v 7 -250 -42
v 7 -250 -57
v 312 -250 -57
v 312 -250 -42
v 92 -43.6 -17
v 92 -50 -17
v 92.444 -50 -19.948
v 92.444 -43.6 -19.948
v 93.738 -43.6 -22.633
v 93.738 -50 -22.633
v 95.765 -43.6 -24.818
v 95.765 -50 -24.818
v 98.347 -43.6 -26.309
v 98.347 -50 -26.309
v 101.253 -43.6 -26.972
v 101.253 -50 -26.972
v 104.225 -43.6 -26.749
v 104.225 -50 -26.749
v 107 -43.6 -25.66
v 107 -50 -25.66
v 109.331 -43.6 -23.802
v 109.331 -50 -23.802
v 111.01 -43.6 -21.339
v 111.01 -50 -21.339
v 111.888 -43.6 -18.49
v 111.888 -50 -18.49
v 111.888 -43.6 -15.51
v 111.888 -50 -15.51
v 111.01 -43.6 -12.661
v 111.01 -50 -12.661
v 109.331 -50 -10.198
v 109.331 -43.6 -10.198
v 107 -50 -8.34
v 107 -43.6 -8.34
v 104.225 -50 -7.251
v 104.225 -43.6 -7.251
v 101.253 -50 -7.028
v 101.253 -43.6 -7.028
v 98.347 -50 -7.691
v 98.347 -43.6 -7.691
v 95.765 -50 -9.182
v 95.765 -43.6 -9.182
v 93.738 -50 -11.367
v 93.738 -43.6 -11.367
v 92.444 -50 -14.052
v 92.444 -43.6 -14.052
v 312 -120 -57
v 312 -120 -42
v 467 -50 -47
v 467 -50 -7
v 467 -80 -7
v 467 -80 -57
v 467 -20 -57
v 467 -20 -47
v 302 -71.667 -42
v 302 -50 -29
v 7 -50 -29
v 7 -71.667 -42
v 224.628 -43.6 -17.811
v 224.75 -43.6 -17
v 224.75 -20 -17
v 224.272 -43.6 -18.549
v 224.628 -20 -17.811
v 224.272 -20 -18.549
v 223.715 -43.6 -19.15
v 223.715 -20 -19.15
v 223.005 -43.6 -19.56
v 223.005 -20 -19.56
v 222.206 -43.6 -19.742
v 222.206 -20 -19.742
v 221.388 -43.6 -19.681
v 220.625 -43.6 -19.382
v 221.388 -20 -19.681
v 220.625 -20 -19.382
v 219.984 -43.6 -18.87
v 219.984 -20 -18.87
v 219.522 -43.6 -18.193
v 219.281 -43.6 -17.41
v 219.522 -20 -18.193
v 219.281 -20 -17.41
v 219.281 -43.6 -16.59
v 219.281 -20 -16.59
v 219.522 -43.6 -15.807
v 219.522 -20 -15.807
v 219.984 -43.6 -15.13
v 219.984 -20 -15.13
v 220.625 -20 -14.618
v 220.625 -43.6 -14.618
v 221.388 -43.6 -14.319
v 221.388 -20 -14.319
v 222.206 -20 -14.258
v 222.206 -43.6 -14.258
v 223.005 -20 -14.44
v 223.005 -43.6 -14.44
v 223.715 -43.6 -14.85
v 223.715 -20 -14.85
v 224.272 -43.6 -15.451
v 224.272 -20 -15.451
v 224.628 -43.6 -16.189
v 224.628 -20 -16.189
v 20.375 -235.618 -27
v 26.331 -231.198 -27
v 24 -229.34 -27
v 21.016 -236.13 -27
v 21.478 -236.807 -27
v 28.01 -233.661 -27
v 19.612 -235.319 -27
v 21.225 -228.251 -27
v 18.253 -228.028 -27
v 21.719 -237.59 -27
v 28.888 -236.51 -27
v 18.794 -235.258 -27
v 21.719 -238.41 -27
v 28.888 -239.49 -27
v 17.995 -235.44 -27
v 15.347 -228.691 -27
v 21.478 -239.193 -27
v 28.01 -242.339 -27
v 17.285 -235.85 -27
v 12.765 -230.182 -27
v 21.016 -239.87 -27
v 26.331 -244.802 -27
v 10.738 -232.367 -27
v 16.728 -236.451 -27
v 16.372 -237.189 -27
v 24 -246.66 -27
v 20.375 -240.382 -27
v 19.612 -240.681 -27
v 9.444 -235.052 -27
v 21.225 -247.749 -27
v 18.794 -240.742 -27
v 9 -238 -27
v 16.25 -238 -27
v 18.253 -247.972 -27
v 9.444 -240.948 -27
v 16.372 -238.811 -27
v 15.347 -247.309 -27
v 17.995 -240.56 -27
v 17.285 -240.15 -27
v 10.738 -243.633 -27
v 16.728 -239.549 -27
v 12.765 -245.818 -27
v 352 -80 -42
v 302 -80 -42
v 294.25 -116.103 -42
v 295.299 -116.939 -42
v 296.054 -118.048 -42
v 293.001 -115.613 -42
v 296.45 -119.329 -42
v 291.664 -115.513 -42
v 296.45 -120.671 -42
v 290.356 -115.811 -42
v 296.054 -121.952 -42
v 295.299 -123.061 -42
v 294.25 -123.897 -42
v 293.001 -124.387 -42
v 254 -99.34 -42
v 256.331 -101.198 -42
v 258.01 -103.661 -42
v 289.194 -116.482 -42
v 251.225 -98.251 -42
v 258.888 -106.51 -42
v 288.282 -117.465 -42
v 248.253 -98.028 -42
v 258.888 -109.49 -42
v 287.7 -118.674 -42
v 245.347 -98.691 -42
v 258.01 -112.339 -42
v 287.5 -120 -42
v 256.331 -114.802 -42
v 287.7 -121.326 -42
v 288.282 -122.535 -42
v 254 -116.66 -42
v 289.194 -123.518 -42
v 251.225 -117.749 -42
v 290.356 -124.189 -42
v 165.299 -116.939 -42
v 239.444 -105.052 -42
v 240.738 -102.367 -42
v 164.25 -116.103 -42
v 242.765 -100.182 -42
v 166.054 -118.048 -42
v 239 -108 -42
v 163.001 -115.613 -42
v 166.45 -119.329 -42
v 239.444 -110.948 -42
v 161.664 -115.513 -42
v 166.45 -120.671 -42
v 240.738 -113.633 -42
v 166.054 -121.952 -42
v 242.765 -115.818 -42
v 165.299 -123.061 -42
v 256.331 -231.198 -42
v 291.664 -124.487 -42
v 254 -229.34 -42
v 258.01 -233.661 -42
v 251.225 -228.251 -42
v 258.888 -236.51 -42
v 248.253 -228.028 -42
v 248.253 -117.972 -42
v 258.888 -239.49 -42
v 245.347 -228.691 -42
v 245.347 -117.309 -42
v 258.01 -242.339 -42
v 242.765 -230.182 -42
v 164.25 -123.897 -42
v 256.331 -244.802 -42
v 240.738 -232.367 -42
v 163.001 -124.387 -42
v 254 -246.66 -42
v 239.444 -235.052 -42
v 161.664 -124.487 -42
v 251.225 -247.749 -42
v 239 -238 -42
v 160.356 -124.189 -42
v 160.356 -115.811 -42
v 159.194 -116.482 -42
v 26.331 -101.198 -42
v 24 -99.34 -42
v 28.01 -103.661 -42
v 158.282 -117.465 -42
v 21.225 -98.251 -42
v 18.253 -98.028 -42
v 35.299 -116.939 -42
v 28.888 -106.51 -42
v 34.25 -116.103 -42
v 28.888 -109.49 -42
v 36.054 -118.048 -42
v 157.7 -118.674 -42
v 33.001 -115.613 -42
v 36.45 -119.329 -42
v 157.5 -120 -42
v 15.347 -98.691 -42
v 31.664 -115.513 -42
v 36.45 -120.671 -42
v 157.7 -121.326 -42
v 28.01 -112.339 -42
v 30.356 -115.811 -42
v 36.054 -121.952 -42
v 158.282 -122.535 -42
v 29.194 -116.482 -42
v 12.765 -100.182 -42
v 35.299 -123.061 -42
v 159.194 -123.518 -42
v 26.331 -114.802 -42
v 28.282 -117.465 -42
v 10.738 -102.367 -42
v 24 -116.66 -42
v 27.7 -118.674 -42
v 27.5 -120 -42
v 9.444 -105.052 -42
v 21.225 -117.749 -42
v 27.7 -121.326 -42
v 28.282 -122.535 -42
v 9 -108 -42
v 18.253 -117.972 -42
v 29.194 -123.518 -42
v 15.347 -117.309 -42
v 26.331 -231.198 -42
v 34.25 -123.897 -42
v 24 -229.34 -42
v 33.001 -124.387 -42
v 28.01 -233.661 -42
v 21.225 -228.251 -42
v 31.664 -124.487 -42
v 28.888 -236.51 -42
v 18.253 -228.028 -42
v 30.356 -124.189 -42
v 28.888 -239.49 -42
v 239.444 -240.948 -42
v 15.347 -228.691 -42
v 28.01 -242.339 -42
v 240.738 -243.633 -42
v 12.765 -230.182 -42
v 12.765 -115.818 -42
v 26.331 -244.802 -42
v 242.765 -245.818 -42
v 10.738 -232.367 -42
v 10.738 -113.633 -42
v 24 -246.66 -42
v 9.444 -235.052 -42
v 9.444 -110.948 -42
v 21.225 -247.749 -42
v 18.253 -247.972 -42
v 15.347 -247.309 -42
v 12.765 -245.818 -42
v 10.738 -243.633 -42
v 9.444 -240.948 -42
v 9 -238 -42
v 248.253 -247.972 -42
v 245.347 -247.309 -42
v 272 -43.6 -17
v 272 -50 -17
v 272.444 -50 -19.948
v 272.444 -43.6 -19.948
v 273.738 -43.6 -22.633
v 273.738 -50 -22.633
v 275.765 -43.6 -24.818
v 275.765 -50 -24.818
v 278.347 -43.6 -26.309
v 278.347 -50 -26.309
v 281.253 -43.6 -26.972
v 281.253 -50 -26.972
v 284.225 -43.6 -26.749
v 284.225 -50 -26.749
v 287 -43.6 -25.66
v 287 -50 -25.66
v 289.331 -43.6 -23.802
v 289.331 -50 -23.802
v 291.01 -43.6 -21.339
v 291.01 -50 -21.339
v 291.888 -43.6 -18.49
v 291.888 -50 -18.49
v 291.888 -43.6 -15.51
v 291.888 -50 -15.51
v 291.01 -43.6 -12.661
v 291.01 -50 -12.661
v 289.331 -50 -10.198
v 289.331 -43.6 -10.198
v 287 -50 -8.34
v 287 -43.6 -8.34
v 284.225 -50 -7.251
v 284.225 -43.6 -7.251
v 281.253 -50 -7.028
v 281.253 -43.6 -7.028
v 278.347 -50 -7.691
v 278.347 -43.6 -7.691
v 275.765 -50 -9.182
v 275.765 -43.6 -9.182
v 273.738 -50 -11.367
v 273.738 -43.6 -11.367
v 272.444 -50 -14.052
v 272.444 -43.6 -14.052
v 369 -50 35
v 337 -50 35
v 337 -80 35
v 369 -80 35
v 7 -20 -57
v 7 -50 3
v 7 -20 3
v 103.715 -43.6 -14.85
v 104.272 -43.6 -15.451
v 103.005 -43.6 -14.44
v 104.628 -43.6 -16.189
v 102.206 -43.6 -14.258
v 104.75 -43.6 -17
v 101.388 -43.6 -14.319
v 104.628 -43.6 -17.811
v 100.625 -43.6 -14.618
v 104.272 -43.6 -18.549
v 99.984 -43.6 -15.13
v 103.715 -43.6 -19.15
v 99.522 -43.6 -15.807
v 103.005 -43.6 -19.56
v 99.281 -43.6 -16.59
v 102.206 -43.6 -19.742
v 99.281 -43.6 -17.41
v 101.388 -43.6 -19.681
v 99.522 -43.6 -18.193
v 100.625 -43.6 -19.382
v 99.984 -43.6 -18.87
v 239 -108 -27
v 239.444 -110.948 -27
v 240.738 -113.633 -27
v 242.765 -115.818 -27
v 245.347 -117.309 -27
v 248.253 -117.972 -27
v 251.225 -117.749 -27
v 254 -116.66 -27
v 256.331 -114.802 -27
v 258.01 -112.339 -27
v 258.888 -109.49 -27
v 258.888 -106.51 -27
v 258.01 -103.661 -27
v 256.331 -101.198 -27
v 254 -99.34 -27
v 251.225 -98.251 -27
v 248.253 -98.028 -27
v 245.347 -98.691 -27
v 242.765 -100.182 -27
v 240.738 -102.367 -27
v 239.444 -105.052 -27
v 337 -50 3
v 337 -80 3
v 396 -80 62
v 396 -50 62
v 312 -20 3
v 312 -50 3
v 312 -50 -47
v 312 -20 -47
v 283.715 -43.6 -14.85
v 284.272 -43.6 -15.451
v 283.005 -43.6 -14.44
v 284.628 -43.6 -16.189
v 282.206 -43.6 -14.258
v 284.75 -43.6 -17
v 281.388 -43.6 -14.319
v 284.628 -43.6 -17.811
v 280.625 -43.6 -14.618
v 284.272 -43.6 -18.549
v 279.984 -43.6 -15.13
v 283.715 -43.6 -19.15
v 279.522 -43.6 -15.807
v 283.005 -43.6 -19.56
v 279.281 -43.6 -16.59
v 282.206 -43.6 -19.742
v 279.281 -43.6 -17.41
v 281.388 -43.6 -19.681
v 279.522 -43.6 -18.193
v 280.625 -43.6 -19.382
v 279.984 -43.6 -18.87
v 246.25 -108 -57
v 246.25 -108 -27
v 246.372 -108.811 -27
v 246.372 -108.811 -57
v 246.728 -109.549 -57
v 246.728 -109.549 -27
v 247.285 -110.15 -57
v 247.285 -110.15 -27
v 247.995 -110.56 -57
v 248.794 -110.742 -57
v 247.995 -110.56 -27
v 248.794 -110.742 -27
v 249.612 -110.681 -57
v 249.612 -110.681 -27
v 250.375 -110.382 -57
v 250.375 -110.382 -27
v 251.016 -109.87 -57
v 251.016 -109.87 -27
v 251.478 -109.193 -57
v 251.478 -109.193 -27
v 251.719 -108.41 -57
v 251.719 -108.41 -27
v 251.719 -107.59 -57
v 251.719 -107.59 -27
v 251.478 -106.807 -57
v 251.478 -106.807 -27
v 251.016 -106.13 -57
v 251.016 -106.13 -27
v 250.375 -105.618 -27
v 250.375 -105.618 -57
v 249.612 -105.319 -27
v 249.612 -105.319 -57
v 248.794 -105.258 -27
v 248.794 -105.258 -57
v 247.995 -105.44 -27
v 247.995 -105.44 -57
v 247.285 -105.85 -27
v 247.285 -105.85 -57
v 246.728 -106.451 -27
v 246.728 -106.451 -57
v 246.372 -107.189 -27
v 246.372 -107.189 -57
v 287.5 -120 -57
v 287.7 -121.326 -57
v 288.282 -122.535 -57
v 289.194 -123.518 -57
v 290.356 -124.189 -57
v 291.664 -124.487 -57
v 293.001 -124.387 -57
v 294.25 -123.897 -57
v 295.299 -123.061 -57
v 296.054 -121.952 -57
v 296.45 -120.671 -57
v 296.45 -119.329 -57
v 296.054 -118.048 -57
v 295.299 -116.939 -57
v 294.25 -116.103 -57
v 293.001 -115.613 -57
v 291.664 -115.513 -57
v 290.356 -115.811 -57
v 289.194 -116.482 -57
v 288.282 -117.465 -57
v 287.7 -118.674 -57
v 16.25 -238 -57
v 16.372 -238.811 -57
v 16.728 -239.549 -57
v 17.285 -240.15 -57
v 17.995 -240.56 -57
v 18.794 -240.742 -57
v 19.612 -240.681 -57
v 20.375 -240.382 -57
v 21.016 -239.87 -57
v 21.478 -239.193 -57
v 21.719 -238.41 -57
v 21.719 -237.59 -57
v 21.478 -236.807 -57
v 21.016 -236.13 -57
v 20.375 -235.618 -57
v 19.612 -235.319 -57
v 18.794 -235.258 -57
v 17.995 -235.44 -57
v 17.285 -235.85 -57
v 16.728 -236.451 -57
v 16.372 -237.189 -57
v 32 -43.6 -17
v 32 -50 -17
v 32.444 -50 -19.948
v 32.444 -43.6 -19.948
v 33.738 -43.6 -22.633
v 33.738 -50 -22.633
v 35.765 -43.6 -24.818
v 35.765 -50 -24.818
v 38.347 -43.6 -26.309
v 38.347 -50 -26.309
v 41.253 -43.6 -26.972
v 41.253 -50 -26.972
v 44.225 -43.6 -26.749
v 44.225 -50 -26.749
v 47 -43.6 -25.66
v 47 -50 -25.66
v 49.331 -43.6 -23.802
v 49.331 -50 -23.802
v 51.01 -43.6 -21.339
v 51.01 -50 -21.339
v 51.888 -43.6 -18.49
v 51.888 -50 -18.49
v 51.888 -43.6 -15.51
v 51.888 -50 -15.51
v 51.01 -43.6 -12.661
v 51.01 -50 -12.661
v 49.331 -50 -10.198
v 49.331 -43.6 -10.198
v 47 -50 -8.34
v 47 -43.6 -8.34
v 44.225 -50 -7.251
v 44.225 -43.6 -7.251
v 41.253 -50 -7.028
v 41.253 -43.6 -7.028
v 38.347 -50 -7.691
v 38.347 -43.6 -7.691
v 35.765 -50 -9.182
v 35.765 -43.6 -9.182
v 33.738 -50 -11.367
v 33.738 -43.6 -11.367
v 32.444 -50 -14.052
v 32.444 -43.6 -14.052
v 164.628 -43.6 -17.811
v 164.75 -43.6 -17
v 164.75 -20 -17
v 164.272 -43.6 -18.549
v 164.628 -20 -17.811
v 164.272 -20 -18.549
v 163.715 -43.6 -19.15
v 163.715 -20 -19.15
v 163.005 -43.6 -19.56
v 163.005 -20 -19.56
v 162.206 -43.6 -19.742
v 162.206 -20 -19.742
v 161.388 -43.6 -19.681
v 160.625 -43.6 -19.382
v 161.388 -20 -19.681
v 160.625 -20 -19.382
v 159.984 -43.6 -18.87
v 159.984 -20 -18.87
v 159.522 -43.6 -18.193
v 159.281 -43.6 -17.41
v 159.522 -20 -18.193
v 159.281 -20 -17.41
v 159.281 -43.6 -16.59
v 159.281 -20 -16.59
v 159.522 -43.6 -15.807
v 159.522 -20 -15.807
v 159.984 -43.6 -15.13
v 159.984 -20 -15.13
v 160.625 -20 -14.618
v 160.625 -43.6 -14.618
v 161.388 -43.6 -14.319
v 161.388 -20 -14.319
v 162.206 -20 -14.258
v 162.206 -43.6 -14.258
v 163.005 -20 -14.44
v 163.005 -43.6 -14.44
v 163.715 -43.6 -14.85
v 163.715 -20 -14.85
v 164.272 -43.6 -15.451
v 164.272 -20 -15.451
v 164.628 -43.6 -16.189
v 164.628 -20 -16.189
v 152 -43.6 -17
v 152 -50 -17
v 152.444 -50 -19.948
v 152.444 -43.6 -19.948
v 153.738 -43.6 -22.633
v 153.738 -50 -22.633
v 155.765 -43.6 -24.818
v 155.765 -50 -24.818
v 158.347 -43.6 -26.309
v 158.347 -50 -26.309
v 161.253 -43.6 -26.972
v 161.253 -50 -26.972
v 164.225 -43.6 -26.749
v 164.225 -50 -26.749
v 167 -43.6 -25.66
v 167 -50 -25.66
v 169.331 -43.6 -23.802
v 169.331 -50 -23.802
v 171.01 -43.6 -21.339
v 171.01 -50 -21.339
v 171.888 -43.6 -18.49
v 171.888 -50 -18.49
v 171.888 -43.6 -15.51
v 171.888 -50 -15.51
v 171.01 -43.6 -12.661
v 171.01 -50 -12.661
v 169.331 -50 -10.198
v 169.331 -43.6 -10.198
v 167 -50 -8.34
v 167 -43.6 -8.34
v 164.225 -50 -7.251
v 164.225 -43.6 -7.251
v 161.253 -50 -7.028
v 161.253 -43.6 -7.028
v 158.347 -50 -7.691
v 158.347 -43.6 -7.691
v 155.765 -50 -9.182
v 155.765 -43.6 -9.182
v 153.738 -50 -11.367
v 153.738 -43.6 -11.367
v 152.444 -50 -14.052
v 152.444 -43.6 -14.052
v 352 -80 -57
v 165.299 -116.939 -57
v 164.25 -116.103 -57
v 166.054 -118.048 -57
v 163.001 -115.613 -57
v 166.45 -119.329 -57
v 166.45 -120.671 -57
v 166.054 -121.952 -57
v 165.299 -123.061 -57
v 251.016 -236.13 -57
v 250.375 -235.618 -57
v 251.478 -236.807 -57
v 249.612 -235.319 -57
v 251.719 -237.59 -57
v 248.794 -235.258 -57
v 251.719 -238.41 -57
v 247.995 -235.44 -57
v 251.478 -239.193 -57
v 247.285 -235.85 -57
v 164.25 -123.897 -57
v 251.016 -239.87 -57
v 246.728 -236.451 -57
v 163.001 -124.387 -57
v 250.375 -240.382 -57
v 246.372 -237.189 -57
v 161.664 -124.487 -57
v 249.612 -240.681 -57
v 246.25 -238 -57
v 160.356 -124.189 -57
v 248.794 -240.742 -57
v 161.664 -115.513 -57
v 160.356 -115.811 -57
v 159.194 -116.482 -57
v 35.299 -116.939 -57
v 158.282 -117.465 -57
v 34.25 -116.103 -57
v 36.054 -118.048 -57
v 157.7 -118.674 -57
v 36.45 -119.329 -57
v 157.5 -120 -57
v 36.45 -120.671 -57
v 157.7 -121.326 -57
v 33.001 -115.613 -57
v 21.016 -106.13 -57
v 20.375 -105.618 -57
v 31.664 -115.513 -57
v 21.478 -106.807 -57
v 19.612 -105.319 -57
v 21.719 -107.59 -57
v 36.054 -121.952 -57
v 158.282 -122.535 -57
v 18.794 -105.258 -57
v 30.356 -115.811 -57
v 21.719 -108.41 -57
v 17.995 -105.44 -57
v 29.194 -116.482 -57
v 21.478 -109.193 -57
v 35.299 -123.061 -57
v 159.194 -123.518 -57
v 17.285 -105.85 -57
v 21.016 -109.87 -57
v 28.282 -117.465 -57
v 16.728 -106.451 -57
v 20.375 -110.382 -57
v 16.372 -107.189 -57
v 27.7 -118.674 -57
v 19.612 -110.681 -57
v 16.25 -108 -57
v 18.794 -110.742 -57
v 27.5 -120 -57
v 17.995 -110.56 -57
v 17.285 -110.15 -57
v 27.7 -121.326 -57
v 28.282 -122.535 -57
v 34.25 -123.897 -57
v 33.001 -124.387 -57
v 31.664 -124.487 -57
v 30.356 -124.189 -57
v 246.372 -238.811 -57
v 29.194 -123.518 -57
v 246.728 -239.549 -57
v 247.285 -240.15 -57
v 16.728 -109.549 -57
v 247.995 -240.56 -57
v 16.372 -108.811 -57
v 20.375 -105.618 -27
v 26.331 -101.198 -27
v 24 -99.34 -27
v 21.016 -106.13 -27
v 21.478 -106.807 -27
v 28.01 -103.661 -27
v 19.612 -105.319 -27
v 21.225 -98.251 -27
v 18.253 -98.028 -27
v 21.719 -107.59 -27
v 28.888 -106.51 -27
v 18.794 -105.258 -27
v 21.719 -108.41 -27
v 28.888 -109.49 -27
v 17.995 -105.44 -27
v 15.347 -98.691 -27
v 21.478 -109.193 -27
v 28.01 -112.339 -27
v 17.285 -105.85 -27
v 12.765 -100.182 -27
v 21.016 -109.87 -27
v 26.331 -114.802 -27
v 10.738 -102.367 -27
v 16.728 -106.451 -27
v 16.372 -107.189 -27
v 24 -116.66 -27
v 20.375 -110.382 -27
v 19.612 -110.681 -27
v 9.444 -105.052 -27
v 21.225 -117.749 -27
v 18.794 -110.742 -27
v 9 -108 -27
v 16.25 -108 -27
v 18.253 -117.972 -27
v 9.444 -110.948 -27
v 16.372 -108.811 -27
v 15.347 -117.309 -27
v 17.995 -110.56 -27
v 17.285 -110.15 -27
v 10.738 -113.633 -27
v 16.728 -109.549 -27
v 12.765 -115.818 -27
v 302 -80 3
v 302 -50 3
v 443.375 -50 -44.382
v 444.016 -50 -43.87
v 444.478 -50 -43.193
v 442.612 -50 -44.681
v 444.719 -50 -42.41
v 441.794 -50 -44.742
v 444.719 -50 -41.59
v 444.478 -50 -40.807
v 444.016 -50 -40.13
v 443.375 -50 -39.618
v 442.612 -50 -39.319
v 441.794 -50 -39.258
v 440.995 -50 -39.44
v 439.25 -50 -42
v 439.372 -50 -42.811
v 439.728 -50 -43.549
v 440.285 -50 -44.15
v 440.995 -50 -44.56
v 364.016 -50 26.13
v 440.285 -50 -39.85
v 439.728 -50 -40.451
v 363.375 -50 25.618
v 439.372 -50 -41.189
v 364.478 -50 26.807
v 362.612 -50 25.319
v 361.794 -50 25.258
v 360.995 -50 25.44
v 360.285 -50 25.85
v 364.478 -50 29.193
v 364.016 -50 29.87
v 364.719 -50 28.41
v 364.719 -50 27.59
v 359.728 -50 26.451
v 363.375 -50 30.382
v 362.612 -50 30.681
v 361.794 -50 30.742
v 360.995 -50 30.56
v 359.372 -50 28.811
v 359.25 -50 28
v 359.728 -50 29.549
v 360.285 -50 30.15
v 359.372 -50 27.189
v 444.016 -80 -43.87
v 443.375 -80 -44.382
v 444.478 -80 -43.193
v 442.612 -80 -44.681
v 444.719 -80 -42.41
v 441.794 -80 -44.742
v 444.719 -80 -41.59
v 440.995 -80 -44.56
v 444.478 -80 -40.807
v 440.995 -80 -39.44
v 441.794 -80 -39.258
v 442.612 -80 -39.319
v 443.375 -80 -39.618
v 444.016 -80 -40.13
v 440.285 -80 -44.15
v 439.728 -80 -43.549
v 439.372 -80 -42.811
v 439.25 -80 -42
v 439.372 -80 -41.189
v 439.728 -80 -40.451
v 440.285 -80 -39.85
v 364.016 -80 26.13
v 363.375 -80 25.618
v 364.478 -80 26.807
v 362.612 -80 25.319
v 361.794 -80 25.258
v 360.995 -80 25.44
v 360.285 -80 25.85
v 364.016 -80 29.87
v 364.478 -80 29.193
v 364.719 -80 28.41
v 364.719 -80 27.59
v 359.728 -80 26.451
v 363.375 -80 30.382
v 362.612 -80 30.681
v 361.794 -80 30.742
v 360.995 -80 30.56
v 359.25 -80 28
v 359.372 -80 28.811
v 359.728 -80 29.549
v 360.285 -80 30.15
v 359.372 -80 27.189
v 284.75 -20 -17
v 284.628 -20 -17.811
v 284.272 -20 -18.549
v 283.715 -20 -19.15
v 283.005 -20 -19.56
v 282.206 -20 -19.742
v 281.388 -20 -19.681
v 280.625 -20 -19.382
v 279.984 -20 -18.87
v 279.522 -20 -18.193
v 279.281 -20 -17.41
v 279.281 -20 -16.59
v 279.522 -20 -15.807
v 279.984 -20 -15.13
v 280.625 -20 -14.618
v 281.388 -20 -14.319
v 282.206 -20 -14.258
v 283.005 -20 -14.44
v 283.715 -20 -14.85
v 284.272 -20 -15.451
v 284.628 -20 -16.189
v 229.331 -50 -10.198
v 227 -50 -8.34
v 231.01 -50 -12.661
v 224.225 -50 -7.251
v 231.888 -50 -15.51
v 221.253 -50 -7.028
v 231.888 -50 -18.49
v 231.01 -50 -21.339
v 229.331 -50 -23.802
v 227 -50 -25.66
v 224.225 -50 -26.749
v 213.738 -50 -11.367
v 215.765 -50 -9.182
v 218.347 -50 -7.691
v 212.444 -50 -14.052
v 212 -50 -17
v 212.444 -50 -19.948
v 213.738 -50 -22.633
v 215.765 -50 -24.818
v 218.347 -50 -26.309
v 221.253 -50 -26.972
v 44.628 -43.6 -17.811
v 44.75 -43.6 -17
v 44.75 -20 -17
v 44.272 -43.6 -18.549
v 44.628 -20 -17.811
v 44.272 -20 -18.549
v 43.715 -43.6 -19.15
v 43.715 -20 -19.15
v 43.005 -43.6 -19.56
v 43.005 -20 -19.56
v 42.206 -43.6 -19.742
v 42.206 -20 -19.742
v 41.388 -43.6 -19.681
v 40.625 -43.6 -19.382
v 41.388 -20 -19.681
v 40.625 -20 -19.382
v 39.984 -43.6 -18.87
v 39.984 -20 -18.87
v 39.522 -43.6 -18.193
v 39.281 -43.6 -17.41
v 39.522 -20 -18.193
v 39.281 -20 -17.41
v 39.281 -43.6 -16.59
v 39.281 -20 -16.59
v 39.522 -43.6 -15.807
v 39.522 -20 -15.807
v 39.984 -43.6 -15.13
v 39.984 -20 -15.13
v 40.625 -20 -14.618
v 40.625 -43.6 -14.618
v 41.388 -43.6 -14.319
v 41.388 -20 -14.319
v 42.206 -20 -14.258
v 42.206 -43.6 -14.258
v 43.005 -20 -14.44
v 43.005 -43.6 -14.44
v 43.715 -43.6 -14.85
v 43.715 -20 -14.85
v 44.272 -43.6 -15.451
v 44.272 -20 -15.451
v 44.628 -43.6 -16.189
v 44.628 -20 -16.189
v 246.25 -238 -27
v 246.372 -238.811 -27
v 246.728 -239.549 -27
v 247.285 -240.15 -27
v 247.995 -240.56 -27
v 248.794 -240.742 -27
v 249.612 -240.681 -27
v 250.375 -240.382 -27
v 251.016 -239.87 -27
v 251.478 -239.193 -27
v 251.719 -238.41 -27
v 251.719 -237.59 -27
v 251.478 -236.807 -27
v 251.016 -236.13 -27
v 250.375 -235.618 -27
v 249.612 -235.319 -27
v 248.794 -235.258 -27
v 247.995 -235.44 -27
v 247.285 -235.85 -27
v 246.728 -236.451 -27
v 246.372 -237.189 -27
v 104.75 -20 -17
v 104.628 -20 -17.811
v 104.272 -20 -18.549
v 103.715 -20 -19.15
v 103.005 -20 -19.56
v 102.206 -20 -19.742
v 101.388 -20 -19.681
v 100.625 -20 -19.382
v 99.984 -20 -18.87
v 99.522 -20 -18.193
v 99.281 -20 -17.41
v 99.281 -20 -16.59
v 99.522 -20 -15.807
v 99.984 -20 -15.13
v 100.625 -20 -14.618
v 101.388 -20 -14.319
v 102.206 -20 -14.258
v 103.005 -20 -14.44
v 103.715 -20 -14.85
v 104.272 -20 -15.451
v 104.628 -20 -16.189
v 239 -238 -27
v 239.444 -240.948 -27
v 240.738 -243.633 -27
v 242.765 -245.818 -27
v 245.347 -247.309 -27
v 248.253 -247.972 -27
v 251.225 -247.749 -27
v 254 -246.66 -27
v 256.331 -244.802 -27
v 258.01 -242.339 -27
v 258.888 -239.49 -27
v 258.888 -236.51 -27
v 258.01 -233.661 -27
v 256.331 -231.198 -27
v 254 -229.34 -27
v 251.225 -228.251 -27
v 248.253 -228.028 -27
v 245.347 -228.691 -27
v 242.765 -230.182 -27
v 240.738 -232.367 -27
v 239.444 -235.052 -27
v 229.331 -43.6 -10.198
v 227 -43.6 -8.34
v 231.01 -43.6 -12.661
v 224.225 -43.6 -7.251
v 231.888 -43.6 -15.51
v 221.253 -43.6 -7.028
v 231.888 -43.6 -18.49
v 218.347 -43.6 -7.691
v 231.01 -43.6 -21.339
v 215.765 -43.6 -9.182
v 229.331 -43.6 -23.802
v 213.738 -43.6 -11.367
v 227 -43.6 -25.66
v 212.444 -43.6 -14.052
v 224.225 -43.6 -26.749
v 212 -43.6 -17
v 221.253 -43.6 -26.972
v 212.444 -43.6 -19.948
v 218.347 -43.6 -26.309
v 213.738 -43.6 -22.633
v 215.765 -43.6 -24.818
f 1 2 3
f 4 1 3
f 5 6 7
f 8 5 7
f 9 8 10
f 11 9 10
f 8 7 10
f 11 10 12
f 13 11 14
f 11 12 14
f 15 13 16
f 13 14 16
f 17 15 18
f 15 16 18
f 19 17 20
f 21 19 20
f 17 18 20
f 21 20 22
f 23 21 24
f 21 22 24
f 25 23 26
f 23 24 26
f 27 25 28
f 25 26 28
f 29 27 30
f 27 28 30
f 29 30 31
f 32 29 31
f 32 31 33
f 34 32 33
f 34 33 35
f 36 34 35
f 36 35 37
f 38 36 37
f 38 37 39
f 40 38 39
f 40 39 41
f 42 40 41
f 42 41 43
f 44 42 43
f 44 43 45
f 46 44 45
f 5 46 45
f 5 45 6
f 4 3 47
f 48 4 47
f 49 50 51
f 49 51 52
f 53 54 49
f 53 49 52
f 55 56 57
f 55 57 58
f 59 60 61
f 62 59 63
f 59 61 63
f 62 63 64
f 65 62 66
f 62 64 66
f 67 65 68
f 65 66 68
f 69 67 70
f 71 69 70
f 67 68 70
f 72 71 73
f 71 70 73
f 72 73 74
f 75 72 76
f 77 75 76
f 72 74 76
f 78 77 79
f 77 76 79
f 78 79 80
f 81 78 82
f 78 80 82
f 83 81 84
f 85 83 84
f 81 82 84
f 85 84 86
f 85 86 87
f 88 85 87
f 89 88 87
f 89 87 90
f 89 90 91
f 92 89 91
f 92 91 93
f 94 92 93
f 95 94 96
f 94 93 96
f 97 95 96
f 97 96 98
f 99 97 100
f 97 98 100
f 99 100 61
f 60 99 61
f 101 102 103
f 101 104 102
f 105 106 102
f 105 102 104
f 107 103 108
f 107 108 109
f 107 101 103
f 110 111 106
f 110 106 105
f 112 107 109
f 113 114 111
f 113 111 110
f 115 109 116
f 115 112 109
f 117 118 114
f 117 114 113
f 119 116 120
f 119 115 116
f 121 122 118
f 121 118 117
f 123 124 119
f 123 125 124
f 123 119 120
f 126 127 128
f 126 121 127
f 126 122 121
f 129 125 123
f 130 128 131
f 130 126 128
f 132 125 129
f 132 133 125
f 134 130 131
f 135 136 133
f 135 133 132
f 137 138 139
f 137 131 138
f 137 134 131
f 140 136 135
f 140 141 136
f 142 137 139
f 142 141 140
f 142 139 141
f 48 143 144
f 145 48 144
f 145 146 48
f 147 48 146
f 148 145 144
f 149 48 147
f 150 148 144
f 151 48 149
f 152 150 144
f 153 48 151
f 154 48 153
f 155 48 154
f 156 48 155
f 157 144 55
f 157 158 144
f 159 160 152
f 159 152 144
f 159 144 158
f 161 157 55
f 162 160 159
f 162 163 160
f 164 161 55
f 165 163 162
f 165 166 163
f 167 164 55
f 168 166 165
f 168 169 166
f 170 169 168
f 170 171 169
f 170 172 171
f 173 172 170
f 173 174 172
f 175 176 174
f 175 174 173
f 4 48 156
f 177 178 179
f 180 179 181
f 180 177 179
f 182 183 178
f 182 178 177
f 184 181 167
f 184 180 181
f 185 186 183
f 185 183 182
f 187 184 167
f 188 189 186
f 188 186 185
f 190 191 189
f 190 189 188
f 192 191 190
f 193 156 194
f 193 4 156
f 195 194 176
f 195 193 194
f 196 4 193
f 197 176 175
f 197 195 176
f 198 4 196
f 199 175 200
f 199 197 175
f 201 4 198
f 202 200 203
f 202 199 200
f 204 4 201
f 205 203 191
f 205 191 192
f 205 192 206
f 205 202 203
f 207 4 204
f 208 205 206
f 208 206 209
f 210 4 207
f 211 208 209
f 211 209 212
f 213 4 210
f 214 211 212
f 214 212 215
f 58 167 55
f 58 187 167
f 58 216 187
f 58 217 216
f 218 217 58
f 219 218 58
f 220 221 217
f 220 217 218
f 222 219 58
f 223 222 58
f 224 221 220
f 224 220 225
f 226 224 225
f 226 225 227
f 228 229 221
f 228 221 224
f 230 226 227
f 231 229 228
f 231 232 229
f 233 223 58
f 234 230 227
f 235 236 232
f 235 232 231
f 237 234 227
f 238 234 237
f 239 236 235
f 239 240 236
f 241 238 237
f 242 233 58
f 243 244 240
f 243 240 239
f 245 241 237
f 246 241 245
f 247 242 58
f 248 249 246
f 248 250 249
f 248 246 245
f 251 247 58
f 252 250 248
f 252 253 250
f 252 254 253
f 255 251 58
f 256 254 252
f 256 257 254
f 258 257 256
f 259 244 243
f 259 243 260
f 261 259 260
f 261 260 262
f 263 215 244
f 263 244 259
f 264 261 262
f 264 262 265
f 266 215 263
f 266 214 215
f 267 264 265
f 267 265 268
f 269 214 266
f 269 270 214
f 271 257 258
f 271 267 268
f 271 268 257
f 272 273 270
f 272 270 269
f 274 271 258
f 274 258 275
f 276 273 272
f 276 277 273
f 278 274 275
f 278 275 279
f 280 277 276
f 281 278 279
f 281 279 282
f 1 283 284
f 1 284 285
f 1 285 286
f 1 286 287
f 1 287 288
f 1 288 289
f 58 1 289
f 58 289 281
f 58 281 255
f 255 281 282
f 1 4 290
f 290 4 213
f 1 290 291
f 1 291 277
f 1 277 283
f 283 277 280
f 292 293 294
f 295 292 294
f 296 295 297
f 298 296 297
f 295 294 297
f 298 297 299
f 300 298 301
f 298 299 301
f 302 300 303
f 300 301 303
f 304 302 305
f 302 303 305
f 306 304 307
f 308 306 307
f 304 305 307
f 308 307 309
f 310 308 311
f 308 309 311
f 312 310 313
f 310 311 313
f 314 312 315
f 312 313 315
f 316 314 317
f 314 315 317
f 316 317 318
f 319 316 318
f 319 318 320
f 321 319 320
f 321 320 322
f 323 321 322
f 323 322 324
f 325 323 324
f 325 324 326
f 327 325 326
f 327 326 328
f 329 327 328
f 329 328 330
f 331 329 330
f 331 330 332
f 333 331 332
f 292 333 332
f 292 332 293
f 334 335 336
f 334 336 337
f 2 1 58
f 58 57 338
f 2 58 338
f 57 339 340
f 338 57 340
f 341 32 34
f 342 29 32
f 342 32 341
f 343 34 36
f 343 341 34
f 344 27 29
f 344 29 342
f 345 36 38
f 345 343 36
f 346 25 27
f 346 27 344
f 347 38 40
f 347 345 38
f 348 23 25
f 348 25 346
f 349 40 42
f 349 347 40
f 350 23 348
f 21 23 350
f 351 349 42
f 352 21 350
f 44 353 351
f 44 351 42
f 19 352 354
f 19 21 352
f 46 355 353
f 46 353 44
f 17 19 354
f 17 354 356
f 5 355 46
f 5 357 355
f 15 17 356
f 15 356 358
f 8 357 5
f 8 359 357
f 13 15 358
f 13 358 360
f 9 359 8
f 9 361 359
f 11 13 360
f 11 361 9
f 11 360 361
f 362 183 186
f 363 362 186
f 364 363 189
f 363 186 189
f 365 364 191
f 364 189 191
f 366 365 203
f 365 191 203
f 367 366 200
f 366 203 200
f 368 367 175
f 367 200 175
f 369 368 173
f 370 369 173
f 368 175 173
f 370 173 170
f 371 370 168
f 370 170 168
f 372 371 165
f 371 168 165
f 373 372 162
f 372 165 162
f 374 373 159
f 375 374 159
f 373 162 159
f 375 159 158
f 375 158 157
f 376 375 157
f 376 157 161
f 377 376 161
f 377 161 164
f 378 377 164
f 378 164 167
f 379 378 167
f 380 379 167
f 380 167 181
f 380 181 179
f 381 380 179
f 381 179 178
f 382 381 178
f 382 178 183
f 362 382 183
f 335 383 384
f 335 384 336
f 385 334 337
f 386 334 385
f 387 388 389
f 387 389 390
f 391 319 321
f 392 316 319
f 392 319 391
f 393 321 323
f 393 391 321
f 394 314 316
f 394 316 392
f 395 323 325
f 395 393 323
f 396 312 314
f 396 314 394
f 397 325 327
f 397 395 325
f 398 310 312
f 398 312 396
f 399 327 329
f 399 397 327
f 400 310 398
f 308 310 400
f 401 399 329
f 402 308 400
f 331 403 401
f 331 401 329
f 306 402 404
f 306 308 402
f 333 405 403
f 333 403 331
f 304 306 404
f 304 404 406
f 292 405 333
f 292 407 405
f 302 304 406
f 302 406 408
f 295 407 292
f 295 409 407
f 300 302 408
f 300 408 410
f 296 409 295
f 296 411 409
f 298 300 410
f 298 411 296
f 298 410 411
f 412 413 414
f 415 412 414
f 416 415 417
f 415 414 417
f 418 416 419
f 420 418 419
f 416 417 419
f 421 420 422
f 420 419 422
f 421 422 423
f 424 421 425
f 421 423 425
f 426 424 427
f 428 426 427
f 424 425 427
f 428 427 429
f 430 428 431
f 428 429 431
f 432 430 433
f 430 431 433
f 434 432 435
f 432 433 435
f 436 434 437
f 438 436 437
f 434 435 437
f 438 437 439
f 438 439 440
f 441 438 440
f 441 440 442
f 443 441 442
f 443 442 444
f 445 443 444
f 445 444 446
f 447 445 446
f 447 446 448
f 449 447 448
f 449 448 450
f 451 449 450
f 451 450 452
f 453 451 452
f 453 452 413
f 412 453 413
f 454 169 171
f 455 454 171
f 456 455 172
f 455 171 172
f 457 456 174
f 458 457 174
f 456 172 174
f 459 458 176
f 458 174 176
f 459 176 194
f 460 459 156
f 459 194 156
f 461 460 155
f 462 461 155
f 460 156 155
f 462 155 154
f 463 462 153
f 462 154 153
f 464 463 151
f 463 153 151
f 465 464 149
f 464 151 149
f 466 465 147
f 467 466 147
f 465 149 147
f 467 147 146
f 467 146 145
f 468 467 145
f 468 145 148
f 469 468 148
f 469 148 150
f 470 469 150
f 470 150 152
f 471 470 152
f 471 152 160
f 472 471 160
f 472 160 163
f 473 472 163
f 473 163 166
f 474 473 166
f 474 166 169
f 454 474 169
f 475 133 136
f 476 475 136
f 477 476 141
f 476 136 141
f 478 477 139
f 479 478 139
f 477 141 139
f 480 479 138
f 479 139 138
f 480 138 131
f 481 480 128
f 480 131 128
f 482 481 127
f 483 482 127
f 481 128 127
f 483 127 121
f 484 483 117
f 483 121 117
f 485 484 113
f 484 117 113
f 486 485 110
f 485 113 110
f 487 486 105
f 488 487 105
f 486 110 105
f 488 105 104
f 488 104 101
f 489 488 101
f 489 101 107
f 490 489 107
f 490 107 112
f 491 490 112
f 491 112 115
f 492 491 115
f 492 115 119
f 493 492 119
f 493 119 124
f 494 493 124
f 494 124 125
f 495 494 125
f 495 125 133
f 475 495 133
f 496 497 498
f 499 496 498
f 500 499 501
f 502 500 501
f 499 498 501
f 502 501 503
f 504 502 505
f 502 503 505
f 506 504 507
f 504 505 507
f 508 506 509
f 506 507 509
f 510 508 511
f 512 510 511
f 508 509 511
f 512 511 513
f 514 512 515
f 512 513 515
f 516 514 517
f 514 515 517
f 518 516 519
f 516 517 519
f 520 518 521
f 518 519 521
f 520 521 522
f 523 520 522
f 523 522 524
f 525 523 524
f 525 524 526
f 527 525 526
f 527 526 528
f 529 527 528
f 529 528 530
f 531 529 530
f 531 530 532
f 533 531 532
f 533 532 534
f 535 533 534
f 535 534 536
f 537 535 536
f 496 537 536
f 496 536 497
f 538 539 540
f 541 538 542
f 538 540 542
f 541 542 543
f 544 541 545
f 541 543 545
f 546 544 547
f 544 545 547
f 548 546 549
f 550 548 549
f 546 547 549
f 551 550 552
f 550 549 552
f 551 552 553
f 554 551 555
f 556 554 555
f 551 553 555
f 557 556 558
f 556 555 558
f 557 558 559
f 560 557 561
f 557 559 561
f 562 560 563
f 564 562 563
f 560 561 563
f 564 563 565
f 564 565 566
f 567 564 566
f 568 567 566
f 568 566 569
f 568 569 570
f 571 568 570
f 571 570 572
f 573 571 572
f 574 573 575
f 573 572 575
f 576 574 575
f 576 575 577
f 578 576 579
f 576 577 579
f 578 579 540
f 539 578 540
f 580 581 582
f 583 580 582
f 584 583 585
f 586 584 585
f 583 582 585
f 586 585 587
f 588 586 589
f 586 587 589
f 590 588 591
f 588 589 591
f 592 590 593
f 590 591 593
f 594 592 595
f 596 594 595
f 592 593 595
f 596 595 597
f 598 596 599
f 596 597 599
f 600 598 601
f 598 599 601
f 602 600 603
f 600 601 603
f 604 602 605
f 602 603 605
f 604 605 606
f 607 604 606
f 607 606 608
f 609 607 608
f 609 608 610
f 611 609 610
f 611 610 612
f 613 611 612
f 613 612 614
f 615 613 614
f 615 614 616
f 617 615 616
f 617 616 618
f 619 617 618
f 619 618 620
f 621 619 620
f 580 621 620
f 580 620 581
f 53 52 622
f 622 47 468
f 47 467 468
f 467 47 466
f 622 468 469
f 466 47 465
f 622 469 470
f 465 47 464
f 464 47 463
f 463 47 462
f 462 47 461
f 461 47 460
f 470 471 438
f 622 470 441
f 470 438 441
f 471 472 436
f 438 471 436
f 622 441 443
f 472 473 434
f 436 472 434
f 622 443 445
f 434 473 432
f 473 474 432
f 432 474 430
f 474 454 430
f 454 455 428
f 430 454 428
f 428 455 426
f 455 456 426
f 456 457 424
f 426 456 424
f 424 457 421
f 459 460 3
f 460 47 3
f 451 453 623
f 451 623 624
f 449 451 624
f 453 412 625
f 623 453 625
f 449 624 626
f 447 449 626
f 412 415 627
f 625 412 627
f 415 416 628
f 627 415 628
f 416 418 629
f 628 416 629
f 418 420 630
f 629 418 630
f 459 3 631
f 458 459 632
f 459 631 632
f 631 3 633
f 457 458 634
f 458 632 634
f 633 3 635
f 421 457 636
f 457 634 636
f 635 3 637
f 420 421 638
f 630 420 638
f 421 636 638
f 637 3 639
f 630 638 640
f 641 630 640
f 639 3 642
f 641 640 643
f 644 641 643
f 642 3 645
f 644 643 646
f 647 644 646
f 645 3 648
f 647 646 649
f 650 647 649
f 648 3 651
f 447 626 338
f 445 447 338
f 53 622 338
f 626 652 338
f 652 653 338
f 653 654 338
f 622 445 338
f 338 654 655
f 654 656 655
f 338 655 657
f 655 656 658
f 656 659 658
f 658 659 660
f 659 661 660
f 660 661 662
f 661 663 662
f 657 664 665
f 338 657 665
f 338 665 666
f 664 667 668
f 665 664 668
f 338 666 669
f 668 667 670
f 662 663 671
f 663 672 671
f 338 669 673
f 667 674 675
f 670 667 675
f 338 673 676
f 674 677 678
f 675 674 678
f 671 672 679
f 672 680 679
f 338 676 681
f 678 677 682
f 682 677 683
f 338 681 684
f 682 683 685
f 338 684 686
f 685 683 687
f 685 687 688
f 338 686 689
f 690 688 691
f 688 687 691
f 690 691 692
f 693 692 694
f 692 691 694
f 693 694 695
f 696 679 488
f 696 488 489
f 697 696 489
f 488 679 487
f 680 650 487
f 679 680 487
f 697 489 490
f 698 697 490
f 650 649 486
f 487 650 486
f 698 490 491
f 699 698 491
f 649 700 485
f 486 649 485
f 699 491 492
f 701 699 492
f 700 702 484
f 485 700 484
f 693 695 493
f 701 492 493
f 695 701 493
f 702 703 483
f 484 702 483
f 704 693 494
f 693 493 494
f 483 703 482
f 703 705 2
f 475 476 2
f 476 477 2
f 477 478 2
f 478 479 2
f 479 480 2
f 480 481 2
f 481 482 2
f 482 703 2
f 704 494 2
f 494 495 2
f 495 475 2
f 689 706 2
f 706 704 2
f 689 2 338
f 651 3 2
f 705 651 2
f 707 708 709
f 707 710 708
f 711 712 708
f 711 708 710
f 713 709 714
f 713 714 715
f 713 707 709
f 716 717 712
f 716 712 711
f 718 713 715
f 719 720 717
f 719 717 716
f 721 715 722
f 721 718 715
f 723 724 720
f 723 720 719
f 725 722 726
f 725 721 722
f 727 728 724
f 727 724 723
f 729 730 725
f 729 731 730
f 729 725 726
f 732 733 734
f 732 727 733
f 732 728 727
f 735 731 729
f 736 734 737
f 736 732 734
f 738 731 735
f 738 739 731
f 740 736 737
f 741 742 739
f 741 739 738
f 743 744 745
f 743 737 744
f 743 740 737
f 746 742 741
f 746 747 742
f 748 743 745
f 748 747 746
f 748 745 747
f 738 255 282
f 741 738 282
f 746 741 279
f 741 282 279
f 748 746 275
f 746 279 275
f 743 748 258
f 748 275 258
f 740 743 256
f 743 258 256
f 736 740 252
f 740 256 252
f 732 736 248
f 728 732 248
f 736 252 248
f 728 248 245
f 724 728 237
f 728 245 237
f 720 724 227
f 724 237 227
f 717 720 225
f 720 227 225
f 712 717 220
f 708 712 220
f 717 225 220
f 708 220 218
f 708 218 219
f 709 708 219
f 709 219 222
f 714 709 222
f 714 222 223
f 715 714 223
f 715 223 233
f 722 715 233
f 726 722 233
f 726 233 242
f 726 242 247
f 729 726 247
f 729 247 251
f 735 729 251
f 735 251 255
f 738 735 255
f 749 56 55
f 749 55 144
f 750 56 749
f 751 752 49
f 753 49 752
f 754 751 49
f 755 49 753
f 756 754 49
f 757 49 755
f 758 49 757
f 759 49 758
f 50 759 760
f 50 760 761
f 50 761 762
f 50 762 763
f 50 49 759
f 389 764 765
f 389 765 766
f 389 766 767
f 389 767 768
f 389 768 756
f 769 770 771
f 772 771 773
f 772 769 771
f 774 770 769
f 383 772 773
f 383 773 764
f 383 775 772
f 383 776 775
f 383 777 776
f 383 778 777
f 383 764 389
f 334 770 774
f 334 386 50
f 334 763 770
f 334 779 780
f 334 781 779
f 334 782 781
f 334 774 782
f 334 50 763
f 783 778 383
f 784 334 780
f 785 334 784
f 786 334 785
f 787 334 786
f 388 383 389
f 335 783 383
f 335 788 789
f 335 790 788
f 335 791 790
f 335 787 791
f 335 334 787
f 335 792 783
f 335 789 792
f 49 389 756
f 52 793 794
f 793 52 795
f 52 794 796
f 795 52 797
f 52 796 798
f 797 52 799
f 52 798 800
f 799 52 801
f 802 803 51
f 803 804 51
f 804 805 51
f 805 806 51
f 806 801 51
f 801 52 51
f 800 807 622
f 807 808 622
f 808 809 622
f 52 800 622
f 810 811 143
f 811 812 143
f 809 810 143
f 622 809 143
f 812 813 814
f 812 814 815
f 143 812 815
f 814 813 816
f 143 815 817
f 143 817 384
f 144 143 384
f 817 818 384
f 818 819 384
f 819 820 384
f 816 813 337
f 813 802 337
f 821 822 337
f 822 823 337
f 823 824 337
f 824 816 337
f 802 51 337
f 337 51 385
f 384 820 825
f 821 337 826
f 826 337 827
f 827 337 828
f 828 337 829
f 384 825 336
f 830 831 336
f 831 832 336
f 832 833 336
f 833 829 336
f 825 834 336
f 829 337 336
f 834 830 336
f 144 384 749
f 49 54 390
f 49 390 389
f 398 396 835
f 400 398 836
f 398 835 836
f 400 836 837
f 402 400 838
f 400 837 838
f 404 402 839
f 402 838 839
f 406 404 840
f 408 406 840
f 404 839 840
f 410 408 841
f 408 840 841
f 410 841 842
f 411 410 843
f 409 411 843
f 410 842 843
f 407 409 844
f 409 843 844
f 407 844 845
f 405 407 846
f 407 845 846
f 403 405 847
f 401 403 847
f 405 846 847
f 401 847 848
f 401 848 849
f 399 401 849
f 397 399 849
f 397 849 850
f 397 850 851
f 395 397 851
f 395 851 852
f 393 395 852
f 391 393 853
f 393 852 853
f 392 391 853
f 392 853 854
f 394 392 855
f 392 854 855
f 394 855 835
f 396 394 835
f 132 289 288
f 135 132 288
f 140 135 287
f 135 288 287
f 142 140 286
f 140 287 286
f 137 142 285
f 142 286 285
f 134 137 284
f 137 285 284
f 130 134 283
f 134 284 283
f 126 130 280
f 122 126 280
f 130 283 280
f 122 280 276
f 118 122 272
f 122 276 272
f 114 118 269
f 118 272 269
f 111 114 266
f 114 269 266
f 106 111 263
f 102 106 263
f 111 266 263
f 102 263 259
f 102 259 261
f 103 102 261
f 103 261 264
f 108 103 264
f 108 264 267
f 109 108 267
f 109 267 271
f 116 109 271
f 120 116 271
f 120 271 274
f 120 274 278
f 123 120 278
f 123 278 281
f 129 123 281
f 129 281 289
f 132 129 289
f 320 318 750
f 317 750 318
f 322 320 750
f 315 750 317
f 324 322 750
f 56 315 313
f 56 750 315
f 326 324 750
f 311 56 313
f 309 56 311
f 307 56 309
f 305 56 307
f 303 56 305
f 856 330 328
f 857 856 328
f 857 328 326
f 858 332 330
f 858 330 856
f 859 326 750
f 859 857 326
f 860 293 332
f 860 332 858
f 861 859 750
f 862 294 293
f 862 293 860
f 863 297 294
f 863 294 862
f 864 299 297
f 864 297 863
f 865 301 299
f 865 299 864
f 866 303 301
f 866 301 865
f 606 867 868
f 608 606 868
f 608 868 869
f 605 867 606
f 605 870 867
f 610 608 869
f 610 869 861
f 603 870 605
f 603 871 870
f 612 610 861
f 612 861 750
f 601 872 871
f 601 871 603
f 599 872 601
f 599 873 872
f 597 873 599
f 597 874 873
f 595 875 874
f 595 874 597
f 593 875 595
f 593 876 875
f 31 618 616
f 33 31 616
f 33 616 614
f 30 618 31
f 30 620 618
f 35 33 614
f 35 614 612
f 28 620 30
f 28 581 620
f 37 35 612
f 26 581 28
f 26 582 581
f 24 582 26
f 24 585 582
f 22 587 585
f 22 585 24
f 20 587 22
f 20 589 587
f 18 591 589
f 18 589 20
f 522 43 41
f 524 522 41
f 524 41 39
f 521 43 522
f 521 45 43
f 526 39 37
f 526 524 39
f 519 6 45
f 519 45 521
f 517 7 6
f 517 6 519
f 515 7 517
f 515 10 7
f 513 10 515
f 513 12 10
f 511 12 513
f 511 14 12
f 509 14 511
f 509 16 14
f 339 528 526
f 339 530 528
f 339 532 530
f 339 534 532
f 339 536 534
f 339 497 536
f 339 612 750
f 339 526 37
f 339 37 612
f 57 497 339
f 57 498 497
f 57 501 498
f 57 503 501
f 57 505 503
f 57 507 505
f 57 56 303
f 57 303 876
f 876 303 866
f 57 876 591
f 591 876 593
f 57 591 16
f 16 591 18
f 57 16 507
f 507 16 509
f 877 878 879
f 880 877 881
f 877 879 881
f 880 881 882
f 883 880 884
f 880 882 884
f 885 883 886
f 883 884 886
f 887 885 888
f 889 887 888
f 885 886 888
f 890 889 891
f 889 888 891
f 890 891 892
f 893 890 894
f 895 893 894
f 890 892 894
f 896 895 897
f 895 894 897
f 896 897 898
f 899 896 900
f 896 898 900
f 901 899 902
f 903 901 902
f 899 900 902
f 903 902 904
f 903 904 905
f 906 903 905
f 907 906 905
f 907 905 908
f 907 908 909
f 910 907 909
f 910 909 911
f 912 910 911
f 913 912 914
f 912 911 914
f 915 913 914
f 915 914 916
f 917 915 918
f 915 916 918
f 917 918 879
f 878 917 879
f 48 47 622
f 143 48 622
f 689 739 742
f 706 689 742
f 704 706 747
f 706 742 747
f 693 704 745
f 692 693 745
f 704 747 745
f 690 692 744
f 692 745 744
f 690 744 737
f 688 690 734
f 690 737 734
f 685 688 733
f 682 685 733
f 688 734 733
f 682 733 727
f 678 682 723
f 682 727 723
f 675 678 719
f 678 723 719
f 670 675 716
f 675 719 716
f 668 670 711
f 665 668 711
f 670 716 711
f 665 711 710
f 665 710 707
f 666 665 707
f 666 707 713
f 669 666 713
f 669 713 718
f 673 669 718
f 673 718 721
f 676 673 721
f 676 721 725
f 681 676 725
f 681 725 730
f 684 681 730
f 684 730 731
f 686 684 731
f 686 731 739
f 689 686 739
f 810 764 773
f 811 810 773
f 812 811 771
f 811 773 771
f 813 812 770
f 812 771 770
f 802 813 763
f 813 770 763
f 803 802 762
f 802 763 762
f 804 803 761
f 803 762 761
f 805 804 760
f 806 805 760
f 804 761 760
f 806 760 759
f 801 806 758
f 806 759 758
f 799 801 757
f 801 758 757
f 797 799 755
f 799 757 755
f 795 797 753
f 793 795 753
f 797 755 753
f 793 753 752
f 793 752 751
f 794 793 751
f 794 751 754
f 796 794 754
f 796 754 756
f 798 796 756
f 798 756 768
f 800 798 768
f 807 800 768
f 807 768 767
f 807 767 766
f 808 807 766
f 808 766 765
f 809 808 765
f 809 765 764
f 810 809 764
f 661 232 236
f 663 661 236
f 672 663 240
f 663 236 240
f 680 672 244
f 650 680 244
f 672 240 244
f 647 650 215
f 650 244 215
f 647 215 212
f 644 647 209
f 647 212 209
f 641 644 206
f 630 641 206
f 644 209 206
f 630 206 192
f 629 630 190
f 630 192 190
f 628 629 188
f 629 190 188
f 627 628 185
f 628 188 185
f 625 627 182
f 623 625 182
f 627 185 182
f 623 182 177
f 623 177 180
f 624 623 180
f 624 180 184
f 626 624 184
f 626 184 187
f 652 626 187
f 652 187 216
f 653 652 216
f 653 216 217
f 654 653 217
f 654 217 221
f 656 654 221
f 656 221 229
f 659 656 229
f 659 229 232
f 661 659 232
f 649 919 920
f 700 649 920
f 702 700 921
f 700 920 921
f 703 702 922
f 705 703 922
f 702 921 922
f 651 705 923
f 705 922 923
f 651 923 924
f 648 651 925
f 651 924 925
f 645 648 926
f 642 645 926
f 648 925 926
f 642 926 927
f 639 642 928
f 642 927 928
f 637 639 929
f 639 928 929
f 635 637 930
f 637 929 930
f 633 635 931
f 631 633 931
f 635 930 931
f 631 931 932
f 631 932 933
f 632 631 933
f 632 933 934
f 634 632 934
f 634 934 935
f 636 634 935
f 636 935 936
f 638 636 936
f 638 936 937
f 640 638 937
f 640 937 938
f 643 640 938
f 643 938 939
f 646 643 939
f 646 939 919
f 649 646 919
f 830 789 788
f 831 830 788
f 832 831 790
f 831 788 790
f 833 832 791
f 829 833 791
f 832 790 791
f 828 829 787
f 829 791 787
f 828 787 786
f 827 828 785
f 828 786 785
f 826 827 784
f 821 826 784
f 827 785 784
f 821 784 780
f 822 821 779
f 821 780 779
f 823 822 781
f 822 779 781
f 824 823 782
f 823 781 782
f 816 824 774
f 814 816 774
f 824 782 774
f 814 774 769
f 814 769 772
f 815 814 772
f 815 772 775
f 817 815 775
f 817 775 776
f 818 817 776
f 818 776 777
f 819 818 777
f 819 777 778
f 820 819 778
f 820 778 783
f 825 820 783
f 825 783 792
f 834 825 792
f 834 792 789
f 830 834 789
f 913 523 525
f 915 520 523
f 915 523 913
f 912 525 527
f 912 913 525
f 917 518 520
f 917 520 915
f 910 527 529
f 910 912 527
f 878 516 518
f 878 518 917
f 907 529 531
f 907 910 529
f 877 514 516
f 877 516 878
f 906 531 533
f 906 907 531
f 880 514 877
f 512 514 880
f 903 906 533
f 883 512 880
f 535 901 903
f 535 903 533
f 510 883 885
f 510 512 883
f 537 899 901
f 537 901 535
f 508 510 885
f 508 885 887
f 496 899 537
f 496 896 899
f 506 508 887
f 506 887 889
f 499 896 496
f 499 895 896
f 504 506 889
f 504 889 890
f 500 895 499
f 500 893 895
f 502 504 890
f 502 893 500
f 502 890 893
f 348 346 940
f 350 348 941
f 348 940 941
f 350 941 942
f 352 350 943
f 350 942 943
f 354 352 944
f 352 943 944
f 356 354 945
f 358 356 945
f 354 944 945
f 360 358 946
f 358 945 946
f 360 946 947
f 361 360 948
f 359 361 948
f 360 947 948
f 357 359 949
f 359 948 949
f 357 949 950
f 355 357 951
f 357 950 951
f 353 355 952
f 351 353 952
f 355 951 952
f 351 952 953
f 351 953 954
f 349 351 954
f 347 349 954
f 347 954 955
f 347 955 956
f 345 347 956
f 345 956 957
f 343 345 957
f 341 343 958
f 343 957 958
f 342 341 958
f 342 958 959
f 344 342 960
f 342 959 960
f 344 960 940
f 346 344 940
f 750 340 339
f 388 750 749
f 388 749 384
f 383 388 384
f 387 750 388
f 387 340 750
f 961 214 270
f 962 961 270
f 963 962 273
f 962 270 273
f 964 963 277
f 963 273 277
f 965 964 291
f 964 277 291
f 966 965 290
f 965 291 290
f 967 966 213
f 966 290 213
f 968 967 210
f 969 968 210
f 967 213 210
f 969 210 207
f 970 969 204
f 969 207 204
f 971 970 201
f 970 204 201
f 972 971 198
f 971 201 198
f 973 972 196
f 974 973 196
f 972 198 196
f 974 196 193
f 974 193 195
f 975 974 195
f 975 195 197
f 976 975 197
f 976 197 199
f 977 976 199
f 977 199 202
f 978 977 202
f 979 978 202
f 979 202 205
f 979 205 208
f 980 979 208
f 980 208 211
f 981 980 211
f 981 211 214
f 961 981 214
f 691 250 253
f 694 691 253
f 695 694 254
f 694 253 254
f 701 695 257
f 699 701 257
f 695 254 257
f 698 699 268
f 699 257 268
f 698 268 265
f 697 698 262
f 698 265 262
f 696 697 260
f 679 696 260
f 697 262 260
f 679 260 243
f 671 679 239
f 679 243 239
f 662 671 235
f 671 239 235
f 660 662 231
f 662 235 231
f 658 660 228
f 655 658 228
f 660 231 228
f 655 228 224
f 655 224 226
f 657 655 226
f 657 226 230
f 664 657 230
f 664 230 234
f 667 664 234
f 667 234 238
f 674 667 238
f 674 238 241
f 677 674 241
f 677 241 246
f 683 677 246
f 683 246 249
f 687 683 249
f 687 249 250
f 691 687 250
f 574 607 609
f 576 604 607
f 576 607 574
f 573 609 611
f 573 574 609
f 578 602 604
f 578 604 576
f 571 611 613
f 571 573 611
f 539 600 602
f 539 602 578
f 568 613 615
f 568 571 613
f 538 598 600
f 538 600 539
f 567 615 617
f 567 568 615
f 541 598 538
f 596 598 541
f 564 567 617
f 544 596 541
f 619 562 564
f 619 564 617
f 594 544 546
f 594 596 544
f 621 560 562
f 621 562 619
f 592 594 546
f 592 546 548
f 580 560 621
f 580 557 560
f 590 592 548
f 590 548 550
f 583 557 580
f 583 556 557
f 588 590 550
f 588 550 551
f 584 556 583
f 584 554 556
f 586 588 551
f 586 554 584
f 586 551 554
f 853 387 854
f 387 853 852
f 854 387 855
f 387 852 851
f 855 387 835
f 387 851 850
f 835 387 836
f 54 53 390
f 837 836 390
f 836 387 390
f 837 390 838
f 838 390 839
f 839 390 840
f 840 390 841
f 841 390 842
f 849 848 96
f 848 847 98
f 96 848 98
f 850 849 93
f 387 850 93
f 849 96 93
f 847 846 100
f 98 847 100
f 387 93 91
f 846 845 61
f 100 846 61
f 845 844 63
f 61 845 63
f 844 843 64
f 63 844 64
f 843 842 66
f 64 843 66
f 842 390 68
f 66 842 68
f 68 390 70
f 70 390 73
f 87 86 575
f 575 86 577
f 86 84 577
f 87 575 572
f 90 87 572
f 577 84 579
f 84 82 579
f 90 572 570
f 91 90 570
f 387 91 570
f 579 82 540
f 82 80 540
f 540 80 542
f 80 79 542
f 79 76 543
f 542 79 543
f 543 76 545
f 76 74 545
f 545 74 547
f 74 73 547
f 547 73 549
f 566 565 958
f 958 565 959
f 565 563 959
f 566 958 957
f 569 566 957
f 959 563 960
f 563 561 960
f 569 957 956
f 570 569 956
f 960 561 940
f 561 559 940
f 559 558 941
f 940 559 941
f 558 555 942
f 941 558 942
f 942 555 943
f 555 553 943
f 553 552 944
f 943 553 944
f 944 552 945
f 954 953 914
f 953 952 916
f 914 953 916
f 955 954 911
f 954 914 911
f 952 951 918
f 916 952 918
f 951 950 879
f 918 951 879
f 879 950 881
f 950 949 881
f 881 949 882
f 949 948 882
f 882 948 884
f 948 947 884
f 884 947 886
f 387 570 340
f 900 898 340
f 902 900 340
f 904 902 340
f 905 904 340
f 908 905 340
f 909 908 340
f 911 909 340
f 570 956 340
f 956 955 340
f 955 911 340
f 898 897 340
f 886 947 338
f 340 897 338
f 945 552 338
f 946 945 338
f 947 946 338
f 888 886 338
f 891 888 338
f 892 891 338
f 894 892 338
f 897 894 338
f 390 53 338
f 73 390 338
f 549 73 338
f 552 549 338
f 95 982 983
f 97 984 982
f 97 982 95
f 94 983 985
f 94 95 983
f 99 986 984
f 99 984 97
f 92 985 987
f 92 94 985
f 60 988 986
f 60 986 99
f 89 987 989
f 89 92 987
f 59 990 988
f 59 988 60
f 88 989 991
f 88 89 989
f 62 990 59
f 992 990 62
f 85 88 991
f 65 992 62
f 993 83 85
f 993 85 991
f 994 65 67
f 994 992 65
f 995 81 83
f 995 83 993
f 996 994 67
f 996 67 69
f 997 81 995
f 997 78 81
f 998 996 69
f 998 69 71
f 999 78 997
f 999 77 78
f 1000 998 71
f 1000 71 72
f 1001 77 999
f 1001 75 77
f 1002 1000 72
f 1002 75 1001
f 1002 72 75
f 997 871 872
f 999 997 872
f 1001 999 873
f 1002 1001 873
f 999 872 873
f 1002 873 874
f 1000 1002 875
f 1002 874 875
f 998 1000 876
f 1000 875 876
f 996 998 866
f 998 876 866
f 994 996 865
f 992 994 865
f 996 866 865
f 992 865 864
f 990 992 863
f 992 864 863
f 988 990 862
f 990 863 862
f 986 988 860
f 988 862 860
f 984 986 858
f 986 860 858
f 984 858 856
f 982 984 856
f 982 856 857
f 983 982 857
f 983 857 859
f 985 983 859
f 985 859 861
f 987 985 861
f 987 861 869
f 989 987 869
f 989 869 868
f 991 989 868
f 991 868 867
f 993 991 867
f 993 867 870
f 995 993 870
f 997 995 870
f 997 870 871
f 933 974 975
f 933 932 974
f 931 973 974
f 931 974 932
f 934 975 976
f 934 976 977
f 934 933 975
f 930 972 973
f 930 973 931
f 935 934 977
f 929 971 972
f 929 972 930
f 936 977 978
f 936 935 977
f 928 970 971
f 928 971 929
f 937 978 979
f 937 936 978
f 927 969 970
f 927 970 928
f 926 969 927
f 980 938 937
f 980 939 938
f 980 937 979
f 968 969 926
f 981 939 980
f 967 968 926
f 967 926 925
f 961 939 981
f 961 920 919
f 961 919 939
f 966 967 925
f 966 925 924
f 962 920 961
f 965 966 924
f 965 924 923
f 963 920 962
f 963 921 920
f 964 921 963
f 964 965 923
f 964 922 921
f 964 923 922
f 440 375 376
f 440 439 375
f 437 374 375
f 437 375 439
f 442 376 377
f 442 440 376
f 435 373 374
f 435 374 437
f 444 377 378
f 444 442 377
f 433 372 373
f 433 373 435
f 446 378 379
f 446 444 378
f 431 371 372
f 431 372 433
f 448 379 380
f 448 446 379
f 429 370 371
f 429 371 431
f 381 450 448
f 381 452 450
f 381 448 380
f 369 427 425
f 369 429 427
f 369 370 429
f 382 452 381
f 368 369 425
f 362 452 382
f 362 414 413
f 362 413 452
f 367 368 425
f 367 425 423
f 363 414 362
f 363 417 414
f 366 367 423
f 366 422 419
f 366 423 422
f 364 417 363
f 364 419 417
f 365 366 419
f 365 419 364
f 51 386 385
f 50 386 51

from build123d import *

# Parameters (mm, degrees)
PAD004_DEPTH            = 15
SKETCH010_W             = 305
SKETCH010_H             = 30
PAD005_DEPTH            = 60
HOLE002_D               = 5.5
HOLE002_DEPTH           = 57
HOLE002_CBORE_D         = 20
HOLE002_CBORE_DEPTH     = 6.4
PAD006_DEPTH            = 305
SKETCH013_R             = 4.5
HOLE003_DEPTH           = 25
PAD011_DEPTH            = 30
SKETCH026_R             = 2.75
HOLE006_DEPTH           = 230.001
SKETCH027_W             = 30
SKETCH027_H             = 6
POCKET004_DEPTH         = 172
SKETCH028_R             = 10
PAD012_DEPTH            = 30
SKETCH029_R             = 2.75
HOLE007_DEPTH           = 37
BODY005_PLACEMENT_ANGLE = 180


with BuildPart() as part:
    # Sketch009 → Pad004 (new body)
    with BuildSketch(Plane.XY):
        Polygon((-155, 0), (305, 0), (305, 230), (0, 230), (0, 100), (-40, 60), (-155, 60), align=None)
    extrude(amount=PAD004_DEPTH)

    # Sketch010 → Pad005 (join)
    with BuildSketch(Plane.XY):
        with Locations((152.5, 15)):
            Rectangle(SKETCH010_W, SKETCH010_H)
    extrude(amount=PAD005_DEPTH)

    # Hole002
    with Locations(Plane(origin=(0, 30, 0), x_dir=(1, 0, 0), z_dir=(0, 1, 0))):
        with Locations((270, -40), (210, -40), (150, -40), (90, -40), (30, -40)):
            CounterBoreHole(HOLE002_D / 2, HOLE002_CBORE_D / 2, HOLE002_CBORE_DEPTH, depth=HOLE002_DEPTH)

    # Sketch012 → Pad006 (join)
    with BuildSketch(Plane.YZ):
        Polygon((30, 28), (60, 10), (30, 10), align=None)
    extrude(amount=PAD006_DEPTH)

    # Sketch013 → Hole003 (cut)
    with BuildSketch(Plane.XY.offset(15)):
        with Locations((20, 100)):
            Circle(SKETCH013_R)
        with Locations((280, 100)):
            Circle(SKETCH013_R)
        with Locations((150, 100)):
            Circle(SKETCH013_R)
    extrude(amount=-HOLE003_DEPTH, mode=Mode.SUBTRACT)

    # Sketch025 → Pad011 (join)
    with BuildSketch(Plane.XZ.offset(-30)):
        Polygon((-25, 60), (-25, 92), (-57, 92), (-84, 119), (-155, 50), (-155, 0), (10, 0), (10, 60), align=None)
    extrude(amount=-PAD011_DEPTH)

    # Sketch026 → Hole006 (cut, through all)
    with BuildSketch(Plane.XZ):
        with Locations((-50, 85)):
            Circle(SKETCH026_R)
        with Locations((-130, 15)):
            Circle(SKETCH026_R)
    extrude(amount=-HOLE006_DEPTH, mode=Mode.SUBTRACT)

    # Sketch027 → Pocket004 (cut)
    with BuildSketch(Plane.YZ):
        with Locations((15, 13)):
            Rectangle(SKETCH027_W, SKETCH027_H)
    extrude(amount=-POCKET004_DEPTH, mode=Mode.SUBTRACT)

    # Sketch028 → Pad012 (join)
    with BuildSketch(Plane.XY):
        with Locations((63, 218)):
            Circle(SKETCH028_R)
        with Locations((293, 218)):
            Circle(SKETCH028_R)
        with Locations((293, 88)):
            Circle(SKETCH028_R)
        with Locations((63, 88)):
            Circle(SKETCH028_R)
    extrude(amount=PAD012_DEPTH)

    # Sketch029 → Hole007 (cut)
    with BuildSketch(Plane.XY.offset(30)):
        with Locations((63, 218)):
            Circle(SKETCH029_R)
        with Locations((293, 218)):
            Circle(SKETCH029_R)
        with Locations((293, 88)):
            Circle(SKETCH029_R)
        with Locations((63, 88)):
            Circle(SKETCH029_R)
    extrude(amount=-HOLE007_DEPTH, mode=Mode.SUBTRACT)


with BuildPart() as part_1:
    # Body005 placement: moved
    add(part.part.moved(Location((312, -20, -57))).rotate(Axis((312, -20, -57), (0, 0, 1)), BODY005_PLACEMENT_ANGLE))


solid = part_1.part
